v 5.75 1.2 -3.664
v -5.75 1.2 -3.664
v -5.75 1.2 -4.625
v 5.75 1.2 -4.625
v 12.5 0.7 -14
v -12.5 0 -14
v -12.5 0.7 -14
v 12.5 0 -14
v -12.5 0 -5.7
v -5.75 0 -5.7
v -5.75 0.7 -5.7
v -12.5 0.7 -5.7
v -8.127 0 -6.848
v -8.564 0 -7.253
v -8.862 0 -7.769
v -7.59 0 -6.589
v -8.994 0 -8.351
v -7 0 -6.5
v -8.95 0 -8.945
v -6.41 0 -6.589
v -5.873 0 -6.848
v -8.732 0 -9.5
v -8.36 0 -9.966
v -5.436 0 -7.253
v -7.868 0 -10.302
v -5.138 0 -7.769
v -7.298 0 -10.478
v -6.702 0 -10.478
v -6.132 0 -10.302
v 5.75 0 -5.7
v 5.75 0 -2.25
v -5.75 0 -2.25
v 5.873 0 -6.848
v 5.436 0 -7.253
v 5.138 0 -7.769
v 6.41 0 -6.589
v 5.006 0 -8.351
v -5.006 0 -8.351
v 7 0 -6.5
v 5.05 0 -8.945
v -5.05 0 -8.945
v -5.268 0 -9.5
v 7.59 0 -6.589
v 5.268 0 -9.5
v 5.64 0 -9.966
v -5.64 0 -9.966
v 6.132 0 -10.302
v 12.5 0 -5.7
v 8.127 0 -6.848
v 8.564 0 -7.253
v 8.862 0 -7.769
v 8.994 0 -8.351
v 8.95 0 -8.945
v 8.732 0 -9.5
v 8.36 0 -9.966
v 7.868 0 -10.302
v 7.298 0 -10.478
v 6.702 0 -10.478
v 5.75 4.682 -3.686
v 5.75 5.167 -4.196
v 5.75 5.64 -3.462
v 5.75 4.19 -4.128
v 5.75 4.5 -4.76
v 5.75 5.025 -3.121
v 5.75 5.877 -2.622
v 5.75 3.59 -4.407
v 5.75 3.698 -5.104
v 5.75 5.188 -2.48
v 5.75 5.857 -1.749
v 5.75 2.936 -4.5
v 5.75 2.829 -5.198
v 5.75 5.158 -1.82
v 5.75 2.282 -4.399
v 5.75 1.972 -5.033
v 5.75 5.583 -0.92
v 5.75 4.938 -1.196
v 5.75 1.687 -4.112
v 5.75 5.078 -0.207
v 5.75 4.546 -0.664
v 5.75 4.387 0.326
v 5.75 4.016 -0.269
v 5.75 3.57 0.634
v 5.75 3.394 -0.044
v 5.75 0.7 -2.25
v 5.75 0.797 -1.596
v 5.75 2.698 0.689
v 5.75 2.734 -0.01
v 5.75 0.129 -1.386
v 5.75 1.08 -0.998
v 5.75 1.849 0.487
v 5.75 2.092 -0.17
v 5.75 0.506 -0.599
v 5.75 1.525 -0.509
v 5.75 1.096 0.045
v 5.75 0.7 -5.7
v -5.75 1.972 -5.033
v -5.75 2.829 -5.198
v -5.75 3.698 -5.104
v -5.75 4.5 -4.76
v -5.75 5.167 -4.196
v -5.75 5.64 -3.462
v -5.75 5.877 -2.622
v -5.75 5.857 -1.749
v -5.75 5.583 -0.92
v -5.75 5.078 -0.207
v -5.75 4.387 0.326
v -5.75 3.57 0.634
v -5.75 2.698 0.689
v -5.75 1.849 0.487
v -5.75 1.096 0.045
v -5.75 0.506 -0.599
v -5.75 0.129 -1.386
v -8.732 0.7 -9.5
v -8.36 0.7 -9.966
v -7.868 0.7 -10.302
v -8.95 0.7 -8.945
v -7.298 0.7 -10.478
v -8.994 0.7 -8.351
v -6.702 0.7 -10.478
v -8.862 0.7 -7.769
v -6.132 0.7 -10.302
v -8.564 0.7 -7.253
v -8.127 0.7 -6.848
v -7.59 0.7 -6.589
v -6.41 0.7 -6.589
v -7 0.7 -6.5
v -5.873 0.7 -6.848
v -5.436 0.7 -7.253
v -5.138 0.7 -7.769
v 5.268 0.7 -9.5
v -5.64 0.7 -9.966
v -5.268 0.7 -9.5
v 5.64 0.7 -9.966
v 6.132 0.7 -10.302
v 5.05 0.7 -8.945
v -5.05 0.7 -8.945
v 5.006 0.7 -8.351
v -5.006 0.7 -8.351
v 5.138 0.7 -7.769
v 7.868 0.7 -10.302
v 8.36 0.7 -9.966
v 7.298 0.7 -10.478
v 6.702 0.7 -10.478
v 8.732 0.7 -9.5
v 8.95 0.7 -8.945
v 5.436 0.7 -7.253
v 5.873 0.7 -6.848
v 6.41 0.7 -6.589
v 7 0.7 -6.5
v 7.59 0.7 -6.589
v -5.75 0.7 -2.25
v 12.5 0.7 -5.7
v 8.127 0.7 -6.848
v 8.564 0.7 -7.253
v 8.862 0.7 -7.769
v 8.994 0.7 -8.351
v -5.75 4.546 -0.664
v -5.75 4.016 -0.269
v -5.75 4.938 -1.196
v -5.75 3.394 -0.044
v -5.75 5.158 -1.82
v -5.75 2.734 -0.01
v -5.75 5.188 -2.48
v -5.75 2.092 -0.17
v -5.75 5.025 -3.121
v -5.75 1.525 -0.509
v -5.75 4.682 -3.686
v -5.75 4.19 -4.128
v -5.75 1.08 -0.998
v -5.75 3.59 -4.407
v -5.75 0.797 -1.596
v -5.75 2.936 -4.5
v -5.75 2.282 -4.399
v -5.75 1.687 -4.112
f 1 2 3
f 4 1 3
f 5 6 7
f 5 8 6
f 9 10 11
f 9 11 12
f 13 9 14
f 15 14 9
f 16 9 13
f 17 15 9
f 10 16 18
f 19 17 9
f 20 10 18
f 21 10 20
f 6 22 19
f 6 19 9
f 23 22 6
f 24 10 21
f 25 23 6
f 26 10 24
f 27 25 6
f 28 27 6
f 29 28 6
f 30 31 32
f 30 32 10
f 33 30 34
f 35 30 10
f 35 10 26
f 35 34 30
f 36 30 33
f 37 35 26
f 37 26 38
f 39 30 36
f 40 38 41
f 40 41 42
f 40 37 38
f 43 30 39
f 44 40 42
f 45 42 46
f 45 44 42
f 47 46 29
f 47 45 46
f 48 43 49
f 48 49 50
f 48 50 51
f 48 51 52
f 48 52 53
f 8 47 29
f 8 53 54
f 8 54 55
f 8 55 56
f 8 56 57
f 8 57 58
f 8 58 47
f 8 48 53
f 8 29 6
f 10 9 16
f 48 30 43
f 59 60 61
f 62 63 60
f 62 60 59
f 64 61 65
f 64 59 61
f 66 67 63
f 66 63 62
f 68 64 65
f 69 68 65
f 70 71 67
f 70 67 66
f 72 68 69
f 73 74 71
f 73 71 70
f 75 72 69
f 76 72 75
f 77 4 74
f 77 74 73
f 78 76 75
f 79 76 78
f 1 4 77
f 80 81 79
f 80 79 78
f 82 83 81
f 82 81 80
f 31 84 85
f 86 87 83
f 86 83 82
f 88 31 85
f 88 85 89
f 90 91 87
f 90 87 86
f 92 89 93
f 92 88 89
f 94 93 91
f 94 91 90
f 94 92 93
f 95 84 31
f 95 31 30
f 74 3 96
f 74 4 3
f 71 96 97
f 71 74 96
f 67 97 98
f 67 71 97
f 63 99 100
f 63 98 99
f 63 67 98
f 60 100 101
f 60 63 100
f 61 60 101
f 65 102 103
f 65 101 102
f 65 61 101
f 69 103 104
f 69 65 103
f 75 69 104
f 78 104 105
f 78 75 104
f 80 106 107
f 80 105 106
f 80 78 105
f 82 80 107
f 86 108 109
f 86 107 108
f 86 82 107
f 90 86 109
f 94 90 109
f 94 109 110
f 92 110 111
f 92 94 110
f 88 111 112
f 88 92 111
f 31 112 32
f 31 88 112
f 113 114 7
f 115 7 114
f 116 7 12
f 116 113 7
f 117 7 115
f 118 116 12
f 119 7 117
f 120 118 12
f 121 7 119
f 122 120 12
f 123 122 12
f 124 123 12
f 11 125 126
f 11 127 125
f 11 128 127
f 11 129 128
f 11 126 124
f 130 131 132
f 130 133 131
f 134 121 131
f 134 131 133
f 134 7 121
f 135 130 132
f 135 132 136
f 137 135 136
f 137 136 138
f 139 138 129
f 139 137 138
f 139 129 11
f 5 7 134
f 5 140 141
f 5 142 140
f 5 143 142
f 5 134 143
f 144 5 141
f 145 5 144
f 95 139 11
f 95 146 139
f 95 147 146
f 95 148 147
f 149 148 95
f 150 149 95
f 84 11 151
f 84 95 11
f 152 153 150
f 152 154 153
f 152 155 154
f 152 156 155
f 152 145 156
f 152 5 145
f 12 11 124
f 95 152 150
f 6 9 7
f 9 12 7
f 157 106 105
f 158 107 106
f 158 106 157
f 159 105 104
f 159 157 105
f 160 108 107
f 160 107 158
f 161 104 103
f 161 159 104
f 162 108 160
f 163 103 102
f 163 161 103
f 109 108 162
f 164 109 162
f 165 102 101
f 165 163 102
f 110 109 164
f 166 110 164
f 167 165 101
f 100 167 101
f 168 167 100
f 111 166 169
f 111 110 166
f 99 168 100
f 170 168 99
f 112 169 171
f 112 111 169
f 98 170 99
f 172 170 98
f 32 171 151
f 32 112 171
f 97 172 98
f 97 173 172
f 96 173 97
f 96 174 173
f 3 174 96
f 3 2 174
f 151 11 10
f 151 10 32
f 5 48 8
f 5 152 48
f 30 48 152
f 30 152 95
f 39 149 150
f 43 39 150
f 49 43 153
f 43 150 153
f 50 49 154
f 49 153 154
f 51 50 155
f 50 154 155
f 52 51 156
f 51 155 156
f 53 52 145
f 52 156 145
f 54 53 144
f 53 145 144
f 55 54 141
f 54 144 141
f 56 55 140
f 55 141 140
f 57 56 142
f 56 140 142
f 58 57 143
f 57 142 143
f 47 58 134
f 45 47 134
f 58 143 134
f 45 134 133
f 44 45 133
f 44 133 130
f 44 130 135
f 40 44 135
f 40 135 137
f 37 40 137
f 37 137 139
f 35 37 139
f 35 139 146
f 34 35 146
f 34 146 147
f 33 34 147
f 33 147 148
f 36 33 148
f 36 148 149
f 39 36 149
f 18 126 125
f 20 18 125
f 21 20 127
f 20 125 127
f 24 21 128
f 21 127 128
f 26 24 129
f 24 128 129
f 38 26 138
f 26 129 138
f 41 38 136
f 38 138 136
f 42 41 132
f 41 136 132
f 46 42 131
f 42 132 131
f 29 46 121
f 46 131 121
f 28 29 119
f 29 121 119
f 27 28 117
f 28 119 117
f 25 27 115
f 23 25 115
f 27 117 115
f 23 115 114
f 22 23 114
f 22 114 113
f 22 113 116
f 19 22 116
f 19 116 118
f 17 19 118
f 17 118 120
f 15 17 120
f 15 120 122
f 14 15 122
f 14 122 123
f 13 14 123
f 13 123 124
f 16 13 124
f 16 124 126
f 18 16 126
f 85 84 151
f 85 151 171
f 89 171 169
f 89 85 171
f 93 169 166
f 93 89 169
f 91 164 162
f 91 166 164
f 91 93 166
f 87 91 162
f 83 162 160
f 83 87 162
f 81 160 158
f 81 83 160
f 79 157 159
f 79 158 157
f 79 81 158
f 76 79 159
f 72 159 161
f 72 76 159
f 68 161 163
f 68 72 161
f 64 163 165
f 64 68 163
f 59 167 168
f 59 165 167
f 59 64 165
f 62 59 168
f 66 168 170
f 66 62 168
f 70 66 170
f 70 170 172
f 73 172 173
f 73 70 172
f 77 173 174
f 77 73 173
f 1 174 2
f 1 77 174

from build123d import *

# Parameters (mm, degrees)
SALIENTE_EXTRUIR1_DEPTH    = 12.5
CORTAR_EXTRUIR1_REACH      = 21.475
CROQUIS5_R                 = 2
CORTAR_EXTRUIR2_DEPTH      = 20.475369059
CORTAR_EXTRUIR2_DEPTH_BACK = 20.475369059


with BuildPart() as part:
    # Croquis4 → Saliente-Extruir1 (new, symmetric)
    with BuildSketch(Plane(origin=(0, 0, 0), x_dir=(0, 0, -1), z_dir=(1, 0, 0))):
        with BuildLine():
            Line((14, 0), (14, 0.7))
            Line((14, 0.7), (2.25, 0.7))
            ThreePointArc((2.25, 0.7), (1.5, 5.071320344), (3.664213562, 1.2))
            Line((3.664213562, 1.2), (4.624868417, 1.2))
            ThreePointArc((4.624868417, 1.2), (0.91958653, 5.582964109), (2.25, 0))
            Line((2.25, 0), (14, 0))
        make_face()
    extrude(amount=SALIENTE_EXTRUIR1_DEPTH, both=True)

    # Croquis5 → Cortar-Extruir1 (cut, up to next)
    with BuildSketch(Plane(origin=(0, 0.7, 0), x_dir=(1, 0, 0), z_dir=(0, 1, 0)), mode=Mode.PRIVATE) as cortar_extruir1_sk1:
        with Locations(Location((7, 8.5, 0), (0, 0, 270))):
            Circle(CROQUIS5_R)
    cortar_extruir1_tool1 = extrude(cortar_extruir1_sk1.sketch, amount=-CORTAR_EXTRUIR1_REACH, mode=Mode.PRIVATE) & part.part
    # Croquis5 → Cortar-Extruir1 (cut, up to next)
    with BuildSketch(Plane(origin=(0, 0.7, 0), x_dir=(1, 0, 0), z_dir=(0, 1, 0)), mode=Mode.PRIVATE) as cortar_extruir1_sk2:
        with Locations(Location((-7, 8.5, 0), (0, 0, 270))):
            Circle(CROQUIS5_R)
    cortar_extruir1_tool2 = extrude(cortar_extruir1_sk2.sketch, amount=-CORTAR_EXTRUIR1_REACH, mode=Mode.PRIVATE) & part.part
    add(cortar_extruir1_tool1.solids().sort_by_distance((7, 0.7, -8.5))[0], mode=Mode.SUBTRACT)
    add(cortar_extruir1_tool2.solids().sort_by_distance((-7, 0.7, -8.5))[0], mode=Mode.SUBTRACT)

    # Croquis6 → Cortar-Extruir2 (cut, two sides: drawn at the far end of the back side and taken through both)
    with BuildSketch(Plane(origin=(0, 0.7, 0), x_dir=(1, 0, 0), z_dir=(0, 1, 0)).offset(-CORTAR_EXTRUIR2_DEPTH_BACK)):
        Polygon((-5.75, 5.7), (-13.048594363, 5.7), (-13.048594363, -1.964735147), (14.193675093, -1.964735147), (14.193675093, 5.7), (5.75, 5.7), (5.75, -0.7), (-5.75, -0.7), align=None)
    extrude(amount=CORTAR_EXTRUIR2_DEPTH + CORTAR_EXTRUIR2_DEPTH_BACK, mode=Mode.SUBTRACT)


solid = part.part
